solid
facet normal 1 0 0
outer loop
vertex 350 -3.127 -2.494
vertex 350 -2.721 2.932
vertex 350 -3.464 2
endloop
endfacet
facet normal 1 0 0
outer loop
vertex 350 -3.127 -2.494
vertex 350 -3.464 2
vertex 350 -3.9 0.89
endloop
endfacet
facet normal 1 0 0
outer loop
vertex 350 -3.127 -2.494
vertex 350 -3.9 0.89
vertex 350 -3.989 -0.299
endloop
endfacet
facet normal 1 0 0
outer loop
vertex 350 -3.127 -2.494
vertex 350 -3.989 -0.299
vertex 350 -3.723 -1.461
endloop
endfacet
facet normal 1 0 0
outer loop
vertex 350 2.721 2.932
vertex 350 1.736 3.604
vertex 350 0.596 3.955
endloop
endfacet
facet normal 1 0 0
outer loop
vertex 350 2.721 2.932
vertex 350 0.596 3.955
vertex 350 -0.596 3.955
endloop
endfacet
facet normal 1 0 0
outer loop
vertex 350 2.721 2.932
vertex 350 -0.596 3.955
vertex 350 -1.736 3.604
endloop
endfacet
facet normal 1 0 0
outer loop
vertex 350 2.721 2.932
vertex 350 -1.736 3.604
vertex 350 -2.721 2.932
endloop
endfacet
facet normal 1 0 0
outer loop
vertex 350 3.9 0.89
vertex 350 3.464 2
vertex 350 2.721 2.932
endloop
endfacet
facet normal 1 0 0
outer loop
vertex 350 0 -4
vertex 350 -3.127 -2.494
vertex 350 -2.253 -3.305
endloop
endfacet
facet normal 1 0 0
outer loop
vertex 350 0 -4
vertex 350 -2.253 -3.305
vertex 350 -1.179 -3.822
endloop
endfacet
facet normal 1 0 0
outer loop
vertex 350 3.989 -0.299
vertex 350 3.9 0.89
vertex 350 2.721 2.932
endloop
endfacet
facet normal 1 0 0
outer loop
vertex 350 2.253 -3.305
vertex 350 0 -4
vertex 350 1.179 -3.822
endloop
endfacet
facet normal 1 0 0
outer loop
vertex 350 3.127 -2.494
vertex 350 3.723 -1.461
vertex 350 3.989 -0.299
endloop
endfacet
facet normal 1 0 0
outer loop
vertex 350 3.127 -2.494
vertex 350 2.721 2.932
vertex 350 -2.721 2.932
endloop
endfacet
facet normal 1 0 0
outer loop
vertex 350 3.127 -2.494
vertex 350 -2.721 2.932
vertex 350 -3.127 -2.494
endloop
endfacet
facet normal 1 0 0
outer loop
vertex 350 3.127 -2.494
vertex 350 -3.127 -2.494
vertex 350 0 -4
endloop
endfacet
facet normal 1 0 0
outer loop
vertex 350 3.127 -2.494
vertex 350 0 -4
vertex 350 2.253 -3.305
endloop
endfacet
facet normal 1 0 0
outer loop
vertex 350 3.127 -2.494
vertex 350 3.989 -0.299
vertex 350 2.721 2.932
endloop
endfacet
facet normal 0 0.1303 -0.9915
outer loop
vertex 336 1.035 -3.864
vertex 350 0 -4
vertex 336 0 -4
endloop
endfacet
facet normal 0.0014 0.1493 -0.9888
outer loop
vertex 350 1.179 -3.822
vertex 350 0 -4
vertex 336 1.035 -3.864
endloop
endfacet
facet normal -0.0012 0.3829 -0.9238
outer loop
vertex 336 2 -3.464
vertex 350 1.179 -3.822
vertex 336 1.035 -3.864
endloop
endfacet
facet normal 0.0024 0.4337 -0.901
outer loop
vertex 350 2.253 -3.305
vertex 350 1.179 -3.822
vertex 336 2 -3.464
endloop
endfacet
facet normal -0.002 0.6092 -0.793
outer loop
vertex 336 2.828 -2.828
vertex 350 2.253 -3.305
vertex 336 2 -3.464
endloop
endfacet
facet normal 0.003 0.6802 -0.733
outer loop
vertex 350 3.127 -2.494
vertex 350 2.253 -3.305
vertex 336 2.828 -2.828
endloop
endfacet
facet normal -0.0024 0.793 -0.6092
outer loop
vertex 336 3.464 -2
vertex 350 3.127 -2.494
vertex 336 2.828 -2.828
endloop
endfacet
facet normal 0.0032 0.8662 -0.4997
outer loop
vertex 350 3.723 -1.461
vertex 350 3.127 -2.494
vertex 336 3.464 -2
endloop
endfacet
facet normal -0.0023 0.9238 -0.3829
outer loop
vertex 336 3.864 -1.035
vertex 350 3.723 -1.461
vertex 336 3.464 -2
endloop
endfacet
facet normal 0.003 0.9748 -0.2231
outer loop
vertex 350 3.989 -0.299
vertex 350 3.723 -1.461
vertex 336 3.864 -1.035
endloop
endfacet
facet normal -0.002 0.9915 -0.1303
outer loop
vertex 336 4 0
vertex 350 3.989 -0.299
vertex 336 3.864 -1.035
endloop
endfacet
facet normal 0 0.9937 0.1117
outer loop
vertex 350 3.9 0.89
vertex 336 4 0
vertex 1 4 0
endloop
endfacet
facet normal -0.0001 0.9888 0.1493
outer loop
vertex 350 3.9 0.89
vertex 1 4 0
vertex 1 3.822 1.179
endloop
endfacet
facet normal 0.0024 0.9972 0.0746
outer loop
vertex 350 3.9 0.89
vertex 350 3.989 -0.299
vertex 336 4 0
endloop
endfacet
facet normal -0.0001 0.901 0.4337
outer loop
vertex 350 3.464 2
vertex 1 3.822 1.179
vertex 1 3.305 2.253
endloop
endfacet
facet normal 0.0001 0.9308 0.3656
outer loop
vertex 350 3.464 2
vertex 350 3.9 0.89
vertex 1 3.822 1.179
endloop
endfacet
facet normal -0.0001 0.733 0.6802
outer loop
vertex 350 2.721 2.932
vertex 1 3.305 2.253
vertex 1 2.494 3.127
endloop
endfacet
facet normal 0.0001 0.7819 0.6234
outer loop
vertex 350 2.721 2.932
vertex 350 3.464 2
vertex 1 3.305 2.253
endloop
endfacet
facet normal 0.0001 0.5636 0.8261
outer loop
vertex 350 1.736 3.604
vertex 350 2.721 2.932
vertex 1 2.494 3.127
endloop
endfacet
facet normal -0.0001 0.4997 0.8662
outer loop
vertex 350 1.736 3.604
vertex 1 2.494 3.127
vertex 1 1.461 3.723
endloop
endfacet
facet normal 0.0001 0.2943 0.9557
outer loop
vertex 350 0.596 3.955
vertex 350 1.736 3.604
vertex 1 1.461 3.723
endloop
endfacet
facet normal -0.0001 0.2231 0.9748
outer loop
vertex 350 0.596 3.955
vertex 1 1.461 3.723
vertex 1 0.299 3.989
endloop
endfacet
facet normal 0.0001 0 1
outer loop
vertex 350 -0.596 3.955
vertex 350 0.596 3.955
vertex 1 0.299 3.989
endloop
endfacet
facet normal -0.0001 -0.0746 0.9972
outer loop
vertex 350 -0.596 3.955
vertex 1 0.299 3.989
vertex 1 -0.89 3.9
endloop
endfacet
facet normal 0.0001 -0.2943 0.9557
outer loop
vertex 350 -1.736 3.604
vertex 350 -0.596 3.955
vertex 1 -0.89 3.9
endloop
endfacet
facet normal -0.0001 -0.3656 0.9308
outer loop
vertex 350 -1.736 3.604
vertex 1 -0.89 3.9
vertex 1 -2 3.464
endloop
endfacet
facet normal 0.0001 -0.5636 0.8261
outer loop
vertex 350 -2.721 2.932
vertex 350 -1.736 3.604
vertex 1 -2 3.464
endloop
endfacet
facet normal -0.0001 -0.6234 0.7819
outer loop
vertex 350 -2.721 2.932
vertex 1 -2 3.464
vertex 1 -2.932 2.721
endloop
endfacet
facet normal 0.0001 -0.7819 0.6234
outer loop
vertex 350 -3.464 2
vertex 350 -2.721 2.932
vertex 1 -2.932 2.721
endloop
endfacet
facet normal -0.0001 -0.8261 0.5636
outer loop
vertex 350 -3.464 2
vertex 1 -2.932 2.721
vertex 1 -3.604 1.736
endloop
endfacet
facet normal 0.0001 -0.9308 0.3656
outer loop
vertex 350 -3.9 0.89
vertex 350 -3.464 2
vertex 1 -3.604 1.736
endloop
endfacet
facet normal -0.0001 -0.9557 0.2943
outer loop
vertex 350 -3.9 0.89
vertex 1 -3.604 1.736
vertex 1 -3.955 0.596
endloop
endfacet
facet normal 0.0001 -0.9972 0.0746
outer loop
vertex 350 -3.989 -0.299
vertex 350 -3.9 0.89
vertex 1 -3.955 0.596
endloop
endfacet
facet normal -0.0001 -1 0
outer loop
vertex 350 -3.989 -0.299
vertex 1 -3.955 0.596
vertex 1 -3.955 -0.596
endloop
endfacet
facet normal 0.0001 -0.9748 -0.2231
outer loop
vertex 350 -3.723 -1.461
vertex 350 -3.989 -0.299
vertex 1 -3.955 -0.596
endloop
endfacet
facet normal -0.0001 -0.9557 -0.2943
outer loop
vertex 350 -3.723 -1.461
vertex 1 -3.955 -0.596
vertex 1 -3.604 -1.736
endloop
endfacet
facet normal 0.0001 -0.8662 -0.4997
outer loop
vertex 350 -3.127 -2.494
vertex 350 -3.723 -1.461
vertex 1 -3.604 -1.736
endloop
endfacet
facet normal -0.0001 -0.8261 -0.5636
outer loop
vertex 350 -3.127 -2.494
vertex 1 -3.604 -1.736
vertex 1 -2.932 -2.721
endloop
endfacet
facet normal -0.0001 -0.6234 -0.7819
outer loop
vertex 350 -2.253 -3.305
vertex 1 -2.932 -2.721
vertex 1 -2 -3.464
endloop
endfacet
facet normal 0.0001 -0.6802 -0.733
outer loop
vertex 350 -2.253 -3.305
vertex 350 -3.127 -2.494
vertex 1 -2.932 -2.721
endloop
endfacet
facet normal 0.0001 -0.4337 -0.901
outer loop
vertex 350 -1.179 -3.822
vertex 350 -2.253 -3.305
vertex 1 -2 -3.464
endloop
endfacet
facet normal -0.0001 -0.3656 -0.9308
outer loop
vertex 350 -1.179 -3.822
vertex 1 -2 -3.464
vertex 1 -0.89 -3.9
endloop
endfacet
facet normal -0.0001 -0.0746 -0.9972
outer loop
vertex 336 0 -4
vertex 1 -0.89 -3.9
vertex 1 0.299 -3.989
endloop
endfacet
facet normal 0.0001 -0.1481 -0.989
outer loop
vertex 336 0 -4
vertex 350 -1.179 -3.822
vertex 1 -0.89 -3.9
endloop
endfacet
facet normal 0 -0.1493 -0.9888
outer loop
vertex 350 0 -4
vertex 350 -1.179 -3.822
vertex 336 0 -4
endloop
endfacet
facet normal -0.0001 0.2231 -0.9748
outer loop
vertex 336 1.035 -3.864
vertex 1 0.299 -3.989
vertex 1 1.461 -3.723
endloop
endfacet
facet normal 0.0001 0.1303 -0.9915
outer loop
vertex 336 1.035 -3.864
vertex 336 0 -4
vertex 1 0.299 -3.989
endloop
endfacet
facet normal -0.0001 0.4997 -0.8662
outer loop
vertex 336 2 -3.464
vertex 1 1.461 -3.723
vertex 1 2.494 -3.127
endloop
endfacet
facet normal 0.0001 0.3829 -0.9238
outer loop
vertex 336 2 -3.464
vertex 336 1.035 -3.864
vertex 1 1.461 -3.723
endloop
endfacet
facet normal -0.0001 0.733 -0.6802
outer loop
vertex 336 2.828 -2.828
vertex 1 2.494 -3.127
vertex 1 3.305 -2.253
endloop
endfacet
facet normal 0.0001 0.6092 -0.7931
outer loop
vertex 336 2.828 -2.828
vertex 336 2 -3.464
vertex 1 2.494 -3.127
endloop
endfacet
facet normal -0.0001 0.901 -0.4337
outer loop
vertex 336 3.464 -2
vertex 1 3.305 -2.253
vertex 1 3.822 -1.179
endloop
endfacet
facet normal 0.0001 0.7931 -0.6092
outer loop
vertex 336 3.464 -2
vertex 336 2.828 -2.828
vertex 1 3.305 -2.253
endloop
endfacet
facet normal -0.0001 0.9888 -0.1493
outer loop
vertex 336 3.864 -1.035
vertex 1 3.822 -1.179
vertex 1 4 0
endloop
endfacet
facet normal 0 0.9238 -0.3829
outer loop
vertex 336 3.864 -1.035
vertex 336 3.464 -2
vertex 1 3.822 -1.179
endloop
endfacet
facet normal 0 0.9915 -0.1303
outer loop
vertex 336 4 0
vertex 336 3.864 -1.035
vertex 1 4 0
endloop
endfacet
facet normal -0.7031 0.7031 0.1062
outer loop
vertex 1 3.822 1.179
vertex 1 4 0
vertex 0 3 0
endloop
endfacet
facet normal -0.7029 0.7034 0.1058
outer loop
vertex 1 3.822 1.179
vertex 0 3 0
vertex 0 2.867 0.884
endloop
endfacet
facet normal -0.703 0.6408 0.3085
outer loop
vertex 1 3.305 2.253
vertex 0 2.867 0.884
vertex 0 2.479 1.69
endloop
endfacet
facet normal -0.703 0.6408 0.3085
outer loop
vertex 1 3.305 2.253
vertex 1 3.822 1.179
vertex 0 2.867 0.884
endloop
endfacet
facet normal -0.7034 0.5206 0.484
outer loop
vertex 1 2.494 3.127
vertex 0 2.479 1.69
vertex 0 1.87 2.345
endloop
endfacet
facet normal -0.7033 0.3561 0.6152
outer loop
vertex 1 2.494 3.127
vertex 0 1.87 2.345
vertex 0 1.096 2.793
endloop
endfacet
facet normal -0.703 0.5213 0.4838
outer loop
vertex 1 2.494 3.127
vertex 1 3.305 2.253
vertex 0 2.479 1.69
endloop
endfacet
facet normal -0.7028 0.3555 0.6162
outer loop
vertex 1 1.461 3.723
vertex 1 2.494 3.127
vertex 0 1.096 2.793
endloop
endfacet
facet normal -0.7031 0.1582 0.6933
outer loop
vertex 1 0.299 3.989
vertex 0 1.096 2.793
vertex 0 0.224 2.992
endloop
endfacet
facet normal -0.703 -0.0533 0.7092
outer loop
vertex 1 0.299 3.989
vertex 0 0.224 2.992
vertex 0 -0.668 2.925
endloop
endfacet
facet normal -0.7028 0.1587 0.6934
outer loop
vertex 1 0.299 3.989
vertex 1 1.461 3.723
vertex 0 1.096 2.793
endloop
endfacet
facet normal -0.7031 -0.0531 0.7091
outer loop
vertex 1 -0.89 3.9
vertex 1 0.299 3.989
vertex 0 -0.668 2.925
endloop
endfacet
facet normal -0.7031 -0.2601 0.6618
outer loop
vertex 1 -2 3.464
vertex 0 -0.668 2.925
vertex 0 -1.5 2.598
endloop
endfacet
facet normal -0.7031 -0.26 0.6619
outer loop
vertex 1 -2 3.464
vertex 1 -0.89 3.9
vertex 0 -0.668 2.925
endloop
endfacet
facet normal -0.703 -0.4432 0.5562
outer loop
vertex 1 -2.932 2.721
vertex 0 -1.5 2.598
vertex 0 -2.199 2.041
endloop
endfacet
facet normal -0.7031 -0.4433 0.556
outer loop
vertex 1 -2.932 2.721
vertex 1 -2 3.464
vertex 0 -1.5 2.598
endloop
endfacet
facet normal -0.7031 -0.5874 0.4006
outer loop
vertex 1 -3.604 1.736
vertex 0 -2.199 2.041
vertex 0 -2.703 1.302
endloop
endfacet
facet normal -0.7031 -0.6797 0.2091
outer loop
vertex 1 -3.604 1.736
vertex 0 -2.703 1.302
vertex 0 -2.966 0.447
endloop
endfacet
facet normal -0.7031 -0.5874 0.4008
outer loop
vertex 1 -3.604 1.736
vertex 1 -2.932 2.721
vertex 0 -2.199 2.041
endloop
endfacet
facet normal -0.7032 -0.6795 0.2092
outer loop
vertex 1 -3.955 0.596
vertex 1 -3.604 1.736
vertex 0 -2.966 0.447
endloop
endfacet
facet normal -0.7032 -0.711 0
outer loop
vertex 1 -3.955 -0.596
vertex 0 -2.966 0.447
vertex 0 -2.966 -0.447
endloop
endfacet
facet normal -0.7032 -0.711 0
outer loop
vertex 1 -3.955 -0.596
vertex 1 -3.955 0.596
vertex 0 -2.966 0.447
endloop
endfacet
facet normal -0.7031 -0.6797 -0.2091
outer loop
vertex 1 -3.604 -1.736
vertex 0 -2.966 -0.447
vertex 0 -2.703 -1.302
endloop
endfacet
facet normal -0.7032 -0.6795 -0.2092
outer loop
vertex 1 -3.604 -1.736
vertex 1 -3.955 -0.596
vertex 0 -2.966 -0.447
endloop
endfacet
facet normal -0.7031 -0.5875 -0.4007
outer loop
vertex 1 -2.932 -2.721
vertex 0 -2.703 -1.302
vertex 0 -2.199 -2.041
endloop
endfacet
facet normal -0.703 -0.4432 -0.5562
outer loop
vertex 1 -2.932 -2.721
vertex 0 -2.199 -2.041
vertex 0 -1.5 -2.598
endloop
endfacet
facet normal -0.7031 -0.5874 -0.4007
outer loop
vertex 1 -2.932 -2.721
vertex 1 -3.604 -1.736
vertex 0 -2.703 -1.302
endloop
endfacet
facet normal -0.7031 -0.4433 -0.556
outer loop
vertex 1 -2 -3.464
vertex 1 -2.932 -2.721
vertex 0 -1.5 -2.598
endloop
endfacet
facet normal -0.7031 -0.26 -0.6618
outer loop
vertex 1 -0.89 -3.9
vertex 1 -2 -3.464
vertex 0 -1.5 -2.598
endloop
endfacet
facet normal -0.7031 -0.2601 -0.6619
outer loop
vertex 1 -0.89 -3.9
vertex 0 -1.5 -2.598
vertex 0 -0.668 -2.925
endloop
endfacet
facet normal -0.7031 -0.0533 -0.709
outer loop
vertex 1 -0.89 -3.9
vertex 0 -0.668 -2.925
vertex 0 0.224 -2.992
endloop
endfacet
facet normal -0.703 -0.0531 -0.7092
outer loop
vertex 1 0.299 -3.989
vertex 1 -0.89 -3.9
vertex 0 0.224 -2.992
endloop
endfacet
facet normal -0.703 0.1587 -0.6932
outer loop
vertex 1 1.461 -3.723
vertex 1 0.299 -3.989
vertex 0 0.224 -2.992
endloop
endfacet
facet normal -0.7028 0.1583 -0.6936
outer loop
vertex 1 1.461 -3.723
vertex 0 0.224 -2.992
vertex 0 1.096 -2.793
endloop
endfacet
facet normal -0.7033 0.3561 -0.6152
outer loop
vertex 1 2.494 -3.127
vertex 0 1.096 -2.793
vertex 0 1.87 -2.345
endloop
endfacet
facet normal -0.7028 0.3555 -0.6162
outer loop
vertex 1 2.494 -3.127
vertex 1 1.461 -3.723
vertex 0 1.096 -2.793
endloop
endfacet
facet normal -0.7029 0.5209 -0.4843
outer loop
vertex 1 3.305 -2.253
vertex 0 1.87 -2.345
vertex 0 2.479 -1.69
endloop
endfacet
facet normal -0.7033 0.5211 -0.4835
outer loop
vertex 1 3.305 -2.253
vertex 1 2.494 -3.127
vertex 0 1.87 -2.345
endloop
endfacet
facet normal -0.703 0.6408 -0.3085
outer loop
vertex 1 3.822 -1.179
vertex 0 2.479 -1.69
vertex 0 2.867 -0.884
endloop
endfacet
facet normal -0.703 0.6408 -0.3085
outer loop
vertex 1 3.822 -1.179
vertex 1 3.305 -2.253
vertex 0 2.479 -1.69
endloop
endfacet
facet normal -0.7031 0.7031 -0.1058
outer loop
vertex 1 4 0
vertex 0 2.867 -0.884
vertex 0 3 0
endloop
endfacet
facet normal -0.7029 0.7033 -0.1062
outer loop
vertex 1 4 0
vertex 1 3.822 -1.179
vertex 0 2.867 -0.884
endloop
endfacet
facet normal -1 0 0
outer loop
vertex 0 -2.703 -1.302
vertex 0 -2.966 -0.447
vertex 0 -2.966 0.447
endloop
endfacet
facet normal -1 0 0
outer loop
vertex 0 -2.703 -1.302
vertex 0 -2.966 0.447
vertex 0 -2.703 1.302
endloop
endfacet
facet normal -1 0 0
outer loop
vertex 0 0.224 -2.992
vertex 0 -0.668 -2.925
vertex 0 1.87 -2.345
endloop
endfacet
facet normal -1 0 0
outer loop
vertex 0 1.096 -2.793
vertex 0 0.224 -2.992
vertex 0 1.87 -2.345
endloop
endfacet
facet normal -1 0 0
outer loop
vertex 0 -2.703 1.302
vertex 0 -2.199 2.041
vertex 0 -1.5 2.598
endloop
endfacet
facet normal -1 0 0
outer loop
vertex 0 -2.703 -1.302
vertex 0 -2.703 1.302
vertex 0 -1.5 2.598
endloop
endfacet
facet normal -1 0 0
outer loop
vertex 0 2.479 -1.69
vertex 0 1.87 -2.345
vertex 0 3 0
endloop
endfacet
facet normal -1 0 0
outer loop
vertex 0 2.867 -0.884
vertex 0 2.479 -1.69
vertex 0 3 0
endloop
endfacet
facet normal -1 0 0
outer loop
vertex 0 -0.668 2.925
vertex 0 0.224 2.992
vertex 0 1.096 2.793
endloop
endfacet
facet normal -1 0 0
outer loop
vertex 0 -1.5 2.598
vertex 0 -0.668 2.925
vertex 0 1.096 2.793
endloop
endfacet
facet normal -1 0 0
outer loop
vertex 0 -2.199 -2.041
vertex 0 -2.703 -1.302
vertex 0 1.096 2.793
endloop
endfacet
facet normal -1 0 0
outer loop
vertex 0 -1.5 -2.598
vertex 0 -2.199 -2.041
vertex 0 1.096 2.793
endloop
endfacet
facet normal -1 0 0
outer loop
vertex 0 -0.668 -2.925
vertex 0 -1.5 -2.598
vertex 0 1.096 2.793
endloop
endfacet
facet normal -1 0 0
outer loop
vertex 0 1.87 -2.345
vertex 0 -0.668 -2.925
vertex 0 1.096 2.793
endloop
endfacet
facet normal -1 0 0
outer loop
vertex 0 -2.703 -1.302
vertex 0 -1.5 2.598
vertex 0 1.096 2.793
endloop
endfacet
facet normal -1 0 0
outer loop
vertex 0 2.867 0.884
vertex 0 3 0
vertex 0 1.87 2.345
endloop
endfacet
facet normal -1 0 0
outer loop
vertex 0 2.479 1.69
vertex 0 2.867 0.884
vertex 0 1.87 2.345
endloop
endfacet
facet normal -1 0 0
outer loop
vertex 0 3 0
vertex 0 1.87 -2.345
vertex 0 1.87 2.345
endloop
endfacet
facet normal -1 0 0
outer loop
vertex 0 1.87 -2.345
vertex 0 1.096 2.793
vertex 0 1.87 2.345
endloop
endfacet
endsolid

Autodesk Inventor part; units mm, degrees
ref_plane "Płaszczyzna początkowa" through (0, 0, 0) normal (1, 0, 0) x (0, 1, 0)
ref_plane "XZ Plane" through (0, 0, 0) normal (0, 1, 0) x (-1, 0, 0)
ref_plane "XY Plane" through (0, 0, 0) normal (0, 0, 1) x (1, 0, 0)
sketch "Szkic główny" plane through (0, 0, 0) normal (0, 0, 1) x (1, 0, 0)
  line L0 (0, 0) -> (337, 0)
  line L1 (0, 0) -> (0, 4)
  line L2 (337, 4) -> (337, 0)
  line L3 (0, 4) -> (337, 4)
  dimension "d3" = 8
revolve "Obrót1" add sketch "Szkic główny" angle 360 about axis through (0, 0, 0) along (1, 0, 0)
thread "Gwint1" size "M8x1.25" class "6g" standard "ANSI Metric M Profile" full length
chamfer "Faza1" distance 1 angle 45 2 edges at (0, -4, 0) (337, -4, 0)
sketch "Sketch3" plane through (337, 0, 0) normal (1, 0, 0) x (0, 0, -1)
  circle A0 centre (0, 0) radius 4 projected
  circle A1 centre (0, 0) radius 3 projected
  circle A2 centre (0, 0) radius 3 projected
extrude "Extrusion1" add sketch "Sketch3" along normal blind 13 and the other way blind 1 contours A0 | A1
properties part number "ACMEThread" material "Steel"
